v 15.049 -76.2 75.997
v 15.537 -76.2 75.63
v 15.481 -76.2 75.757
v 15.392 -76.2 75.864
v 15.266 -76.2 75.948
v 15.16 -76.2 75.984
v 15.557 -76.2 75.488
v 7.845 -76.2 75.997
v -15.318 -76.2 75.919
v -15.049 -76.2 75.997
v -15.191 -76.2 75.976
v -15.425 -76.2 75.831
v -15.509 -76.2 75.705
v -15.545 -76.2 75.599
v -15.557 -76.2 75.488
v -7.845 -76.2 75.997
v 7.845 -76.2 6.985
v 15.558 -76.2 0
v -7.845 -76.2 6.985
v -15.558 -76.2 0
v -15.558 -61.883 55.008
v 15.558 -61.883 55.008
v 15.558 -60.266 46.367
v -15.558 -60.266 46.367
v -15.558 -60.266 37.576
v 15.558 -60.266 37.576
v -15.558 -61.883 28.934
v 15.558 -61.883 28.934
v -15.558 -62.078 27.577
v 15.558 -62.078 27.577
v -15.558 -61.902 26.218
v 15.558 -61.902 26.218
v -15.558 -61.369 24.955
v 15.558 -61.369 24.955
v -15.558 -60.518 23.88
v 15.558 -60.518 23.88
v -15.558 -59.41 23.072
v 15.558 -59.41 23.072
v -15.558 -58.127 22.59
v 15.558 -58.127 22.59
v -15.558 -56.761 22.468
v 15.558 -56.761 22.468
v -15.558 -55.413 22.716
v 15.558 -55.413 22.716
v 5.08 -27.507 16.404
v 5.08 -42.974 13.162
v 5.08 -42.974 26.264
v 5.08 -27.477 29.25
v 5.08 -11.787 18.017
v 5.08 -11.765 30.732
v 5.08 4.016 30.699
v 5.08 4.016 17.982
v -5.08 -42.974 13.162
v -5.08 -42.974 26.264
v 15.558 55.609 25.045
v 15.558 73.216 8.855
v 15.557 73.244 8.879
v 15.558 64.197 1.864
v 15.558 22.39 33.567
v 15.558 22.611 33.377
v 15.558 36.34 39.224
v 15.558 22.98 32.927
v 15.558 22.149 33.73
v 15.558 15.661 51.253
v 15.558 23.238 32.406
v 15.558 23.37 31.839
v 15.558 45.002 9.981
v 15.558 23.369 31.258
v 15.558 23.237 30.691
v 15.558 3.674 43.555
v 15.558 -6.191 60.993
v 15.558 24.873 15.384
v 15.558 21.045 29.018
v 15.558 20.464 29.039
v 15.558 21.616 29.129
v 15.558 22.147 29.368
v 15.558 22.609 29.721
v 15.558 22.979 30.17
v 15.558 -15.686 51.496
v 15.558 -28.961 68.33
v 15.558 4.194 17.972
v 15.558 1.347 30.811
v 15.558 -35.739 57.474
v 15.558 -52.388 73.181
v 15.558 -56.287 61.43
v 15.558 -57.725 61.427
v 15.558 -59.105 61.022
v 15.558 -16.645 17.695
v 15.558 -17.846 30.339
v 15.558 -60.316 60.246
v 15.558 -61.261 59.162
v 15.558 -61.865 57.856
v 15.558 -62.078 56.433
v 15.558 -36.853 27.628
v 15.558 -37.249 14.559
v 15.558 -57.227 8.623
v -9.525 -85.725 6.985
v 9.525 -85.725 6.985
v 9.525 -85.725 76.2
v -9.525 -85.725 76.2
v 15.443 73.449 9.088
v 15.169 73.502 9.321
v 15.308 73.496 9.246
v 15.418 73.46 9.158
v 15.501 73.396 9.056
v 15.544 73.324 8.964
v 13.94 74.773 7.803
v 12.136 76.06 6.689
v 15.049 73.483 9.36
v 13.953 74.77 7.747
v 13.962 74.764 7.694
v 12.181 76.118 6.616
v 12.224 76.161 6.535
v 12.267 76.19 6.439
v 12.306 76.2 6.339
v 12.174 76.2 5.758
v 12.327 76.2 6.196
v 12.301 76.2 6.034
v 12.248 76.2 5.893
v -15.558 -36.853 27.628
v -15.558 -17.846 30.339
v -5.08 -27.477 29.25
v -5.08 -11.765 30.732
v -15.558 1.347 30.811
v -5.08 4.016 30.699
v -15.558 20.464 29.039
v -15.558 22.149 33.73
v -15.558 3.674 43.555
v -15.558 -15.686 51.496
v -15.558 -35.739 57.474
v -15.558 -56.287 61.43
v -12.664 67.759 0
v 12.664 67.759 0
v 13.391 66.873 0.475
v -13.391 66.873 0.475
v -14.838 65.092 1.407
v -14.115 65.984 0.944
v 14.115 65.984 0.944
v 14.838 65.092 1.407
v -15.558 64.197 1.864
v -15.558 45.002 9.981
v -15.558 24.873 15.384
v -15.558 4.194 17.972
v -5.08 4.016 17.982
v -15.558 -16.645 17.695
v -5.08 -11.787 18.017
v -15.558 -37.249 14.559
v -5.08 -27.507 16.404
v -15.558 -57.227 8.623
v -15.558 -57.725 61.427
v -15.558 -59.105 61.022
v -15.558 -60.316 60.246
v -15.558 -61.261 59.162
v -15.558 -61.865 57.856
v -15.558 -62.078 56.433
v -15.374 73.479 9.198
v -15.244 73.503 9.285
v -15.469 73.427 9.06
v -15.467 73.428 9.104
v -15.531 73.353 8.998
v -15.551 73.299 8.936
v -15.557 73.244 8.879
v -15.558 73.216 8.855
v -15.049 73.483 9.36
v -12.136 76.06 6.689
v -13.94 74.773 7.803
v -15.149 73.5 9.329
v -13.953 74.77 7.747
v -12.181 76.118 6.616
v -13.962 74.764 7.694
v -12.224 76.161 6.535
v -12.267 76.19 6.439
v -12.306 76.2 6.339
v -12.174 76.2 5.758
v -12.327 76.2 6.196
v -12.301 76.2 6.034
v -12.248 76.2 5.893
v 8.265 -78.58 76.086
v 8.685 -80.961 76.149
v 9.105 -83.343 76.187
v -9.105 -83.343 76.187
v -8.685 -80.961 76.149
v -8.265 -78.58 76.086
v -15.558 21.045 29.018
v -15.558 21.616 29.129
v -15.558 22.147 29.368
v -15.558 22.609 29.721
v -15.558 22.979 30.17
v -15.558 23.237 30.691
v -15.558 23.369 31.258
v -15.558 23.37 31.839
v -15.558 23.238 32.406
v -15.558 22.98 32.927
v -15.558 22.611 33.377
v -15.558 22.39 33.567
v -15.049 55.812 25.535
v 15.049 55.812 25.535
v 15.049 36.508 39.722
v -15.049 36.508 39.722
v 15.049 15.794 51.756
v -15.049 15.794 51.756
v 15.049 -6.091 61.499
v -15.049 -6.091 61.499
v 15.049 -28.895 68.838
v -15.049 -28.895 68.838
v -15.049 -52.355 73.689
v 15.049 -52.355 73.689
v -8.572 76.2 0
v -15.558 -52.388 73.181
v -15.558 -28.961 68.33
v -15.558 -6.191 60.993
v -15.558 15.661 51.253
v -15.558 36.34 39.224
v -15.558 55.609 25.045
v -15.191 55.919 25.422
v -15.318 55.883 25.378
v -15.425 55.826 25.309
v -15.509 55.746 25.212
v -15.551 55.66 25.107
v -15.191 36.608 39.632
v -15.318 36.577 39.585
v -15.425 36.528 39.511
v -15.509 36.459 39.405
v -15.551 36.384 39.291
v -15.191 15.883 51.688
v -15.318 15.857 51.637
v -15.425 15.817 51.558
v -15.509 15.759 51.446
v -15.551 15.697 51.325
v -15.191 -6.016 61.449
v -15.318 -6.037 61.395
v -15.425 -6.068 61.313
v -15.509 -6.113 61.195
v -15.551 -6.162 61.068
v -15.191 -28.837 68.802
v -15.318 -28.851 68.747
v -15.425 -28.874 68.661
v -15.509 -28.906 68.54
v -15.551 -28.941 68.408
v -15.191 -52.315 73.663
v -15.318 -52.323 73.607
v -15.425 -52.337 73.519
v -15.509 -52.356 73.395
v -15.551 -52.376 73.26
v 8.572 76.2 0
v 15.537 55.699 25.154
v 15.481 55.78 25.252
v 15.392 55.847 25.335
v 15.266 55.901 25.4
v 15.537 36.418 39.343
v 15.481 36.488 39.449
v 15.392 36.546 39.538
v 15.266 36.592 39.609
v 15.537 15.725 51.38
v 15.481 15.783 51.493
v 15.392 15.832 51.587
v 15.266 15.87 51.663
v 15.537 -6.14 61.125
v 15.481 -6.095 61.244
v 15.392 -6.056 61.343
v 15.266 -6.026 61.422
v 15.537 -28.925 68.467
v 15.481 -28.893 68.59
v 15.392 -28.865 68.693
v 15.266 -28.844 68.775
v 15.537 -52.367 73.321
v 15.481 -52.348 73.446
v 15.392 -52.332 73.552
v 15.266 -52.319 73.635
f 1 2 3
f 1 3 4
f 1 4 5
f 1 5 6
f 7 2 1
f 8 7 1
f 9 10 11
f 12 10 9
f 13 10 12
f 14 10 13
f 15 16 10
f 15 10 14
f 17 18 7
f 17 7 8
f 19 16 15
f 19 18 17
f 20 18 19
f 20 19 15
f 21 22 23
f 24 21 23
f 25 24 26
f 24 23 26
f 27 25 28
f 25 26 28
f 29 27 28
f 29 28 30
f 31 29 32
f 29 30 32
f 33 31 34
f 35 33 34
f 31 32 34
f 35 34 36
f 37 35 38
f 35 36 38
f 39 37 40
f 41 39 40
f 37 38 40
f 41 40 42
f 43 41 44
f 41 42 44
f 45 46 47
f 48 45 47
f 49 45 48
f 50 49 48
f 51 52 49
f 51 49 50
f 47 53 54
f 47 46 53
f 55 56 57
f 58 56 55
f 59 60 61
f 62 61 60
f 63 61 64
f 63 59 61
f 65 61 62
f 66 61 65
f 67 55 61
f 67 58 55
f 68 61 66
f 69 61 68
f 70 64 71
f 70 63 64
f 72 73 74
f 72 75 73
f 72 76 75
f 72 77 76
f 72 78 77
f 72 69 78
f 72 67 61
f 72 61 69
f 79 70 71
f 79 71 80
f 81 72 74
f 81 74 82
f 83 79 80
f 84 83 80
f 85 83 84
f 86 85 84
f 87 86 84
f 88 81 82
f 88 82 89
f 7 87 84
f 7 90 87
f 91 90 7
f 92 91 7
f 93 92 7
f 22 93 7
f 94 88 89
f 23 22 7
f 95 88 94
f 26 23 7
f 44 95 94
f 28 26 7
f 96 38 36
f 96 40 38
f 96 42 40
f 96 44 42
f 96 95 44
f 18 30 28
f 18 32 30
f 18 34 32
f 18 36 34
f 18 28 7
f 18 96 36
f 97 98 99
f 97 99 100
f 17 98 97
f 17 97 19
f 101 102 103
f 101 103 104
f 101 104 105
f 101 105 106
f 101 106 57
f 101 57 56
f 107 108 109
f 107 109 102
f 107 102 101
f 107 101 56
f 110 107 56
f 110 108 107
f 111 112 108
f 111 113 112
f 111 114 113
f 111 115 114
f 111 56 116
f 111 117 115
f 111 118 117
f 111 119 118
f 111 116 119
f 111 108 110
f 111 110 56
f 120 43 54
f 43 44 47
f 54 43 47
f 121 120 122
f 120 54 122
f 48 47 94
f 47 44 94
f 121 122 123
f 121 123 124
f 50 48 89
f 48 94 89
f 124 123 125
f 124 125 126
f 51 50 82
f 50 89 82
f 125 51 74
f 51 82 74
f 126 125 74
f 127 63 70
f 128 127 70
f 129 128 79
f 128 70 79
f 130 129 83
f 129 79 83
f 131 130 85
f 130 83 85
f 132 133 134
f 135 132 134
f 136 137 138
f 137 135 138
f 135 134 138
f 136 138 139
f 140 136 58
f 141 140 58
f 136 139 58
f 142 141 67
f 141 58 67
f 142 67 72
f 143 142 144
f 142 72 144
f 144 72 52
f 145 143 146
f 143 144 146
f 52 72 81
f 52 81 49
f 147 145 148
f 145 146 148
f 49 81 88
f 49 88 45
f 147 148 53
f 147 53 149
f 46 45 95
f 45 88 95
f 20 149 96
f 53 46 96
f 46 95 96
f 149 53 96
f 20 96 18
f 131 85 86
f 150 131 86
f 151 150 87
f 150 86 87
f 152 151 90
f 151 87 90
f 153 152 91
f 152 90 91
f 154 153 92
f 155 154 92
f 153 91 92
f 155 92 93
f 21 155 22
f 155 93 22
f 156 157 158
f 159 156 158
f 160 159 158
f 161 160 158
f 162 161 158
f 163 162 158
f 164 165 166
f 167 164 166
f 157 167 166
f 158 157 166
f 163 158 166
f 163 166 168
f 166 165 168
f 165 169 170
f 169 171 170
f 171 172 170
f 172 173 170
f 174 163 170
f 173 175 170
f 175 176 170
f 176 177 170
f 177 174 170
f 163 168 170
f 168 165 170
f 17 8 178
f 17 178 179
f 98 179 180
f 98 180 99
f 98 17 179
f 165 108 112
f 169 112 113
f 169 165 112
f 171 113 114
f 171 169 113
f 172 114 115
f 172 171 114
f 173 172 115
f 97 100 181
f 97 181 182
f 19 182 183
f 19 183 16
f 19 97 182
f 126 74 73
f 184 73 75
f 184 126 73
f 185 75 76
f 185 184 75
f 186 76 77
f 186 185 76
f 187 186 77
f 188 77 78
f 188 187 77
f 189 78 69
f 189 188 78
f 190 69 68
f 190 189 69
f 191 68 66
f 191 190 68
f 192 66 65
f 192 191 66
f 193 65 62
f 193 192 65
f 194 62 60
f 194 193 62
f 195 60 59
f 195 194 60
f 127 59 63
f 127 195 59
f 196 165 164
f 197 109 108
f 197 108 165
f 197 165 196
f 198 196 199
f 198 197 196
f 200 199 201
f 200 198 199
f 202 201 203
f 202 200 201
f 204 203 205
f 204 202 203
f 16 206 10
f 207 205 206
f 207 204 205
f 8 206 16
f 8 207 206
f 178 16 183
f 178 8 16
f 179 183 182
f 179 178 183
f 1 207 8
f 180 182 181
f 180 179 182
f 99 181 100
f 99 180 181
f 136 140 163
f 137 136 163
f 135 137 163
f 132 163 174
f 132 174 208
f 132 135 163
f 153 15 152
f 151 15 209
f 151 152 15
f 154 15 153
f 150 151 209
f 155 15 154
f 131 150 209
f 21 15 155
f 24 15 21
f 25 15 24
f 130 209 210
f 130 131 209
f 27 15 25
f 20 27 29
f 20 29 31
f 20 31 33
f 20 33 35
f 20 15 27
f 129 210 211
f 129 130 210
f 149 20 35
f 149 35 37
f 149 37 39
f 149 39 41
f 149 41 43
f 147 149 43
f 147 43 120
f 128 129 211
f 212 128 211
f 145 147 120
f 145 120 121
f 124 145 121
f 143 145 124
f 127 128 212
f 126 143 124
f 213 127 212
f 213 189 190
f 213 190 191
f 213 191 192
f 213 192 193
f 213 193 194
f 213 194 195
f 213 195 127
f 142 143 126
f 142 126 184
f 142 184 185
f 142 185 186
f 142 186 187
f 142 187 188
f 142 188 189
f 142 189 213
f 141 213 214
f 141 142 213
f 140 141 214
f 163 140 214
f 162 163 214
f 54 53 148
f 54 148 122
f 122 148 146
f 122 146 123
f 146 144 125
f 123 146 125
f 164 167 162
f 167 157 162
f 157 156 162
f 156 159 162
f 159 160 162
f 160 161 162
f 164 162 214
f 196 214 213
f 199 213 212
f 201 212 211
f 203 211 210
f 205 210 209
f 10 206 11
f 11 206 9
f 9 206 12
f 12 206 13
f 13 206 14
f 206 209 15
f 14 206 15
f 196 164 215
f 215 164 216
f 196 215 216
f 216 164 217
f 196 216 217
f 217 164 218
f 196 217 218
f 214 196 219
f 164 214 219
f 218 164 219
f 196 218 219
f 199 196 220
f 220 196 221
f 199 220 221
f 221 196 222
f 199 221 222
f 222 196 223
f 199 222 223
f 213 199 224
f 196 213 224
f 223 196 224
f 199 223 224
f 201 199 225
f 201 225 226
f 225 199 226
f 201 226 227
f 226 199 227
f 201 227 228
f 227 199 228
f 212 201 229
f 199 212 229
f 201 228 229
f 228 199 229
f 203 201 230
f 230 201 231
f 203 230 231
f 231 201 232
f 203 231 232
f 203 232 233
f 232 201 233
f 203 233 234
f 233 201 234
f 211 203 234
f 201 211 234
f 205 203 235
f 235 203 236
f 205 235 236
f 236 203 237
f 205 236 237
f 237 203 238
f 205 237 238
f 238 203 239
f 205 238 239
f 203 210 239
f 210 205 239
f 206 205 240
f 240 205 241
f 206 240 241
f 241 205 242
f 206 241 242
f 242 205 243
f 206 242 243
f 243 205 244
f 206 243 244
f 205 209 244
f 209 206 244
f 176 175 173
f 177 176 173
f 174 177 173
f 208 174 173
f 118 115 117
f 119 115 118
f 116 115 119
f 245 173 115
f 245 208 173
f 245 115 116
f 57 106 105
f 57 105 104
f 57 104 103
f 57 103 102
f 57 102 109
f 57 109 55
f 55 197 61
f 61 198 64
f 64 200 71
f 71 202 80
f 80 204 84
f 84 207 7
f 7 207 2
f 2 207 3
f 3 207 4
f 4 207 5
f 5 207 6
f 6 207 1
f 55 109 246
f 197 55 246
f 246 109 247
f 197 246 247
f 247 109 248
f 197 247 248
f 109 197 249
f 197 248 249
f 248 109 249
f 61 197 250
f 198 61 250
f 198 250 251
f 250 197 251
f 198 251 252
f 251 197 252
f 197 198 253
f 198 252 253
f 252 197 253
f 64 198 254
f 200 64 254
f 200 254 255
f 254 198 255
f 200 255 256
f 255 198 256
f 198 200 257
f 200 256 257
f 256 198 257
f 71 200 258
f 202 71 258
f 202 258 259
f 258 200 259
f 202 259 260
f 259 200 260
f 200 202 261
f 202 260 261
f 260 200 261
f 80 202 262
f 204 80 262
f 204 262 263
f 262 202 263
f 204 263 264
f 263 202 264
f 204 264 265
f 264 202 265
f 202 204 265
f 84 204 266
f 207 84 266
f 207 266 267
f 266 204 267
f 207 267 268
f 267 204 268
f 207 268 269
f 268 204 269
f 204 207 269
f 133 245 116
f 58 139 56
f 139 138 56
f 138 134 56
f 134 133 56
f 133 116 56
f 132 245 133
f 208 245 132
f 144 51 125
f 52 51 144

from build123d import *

# Parameters (mm, degrees)
BOSS_EXTRUDE1_DEPTH = 76.2
SKETCH2_W           = 6.985
SKETCH2_H           = 9.525
CUT_EXTRUDE1_DEPTH  = 119.84173867
CUT_EXTRUDE2_DEPTH  = 119.84173867
CUT_EXTRUDE3_DEPTH  = 119.84173867
FILLET1_R           = 2.54
CUT_EXTRUDE4_DEPTH  = 5.08
CUT_EXTRUDE6_DEPTH  = 15.113
FILLET2_R           = 0.508


with BuildPart() as part:
    # Sketch1 → Boss-Extrude1 (new body)
    with BuildSketch(Plane.XY):
        Polygon((-15.5575, 76.2), (15.5575, 76.2), (15.5575, -76.2), (7.845485509, -76.2), (9.525, -85.725), (-9.525, -85.725), (-7.845485509, -76.2), (-15.5575, -76.2), align=None)
    extrude(amount=BOSS_EXTRUDE1_DEPTH)

    # Sketch2 → Cut-Extrude1 (cut, through all)
    with BuildSketch(Plane(origin=(15.5575, 0, 0), x_dir=(0, 0, -1), z_dir=(1, 0, 0))):
        with Locations((-3.4925, -80.9625)):
            Rectangle(SKETCH2_W, SKETCH2_H)
    extrude(amount=-CUT_EXTRUDE1_DEPTH, mode=Mode.SUBTRACT)

    # Sketch3 → Cut-Extrude2 (cut, through all)
    with BuildSketch(Plane(origin=(15.5575, 0, 0), x_dir=(0, 0, -1), z_dir=(1, 0, 0))):
        with BuildLine():
            Line((-76.2, -85.725), (-76.2, -76.2))
            Line((-76.2, -76.2), (-76.2, 76.2))
            Line((-76.2, 76.2), (-6.541803462, 76.2))
            ThreePointArc((-6.541803462, 76.2), (-58.046669251, 2.411215556), (-76.2, -85.725))
        make_face()
        with BuildLine():
            Line((0, -76.2), (0, 67.75939176))
            ThreePointArc((0, 67.75939176), (-18.20597202, -4.22030412), (0, -76.2))
        make_face()
    extrude(amount=-CUT_EXTRUDE2_DEPTH, mode=Mode.SUBTRACT)

    # Sketch6 → Cut-Extrude3 (cut, through all)
    with BuildSketch(Plane(origin=(15.5575, 0, 0), x_dir=(0, 0, -1), z_dir=(1, 0, 0))):
        with BuildLine():
            ThreePointArc((-28.934409948, -61.883434575), (-23.879909813, -60.517759582), (-22.716254779, -55.412963136))
            ThreePointArc((-22.716254779, -55.412963136), (-30.753414225, -11.294498854), (-26.546552055, 33.352305435))
            ThreePointArc((-26.546552055, 33.352305435), (-49.181053892, -9.446405872), (-61.429710833, -56.286781256))
            ThreePointArc((-61.429710833, -56.286781256), (-59.737369376, -60.827463042), (-55.008021131, -61.883434575))
            ThreePointArc((-55.008021131, -61.883434575), (-41.971215539, -60.062859411), (-28.934409948, -61.883434575))
        make_face()
    extrude(amount=-CUT_EXTRUDE3_DEPTH, mode=Mode.SUBTRACT)

    # Fillet1
    fillet1_edges = [part.edges().sort_by_distance(p)[0] for p in [
        (0, 33.352305435, 26.546552055),
    ]]
    fillet(fillet1_edges, radius=FILLET1_R)

    # Sketch7 → Cut-Extrude4 (cut, symmetric)
    with BuildSketch(Plane(origin=(0, 0, 0), x_dir=(0, 0, -1), z_dir=(1, 0, 0))):
        with BuildLine():
            Line((-30.699128799, 4.016230293), (-17.981752538, 4.016230293))
            ThreePointArc((-17.981752538, 4.016230293), (-17.415803594, -19.667907964), (-13.161921654, -42.973769707))
            Line((-13.161921654, -42.973769707), (-26.264177108, -42.973769707))
            ThreePointArc((-26.264177108, -42.973769707), (-30.179968378, -19.639057999), (-30.699128799, 4.016230293))
        make_face()
    extrude(amount=CUT_EXTRUDE4_DEPTH, both=True, mode=Mode.SUBTRACT)

    # Sketch10 → Cut-Extrude6 (cut, symmetric)
    with BuildSketch(Plane(origin=(15.5575, 76.2, 6.541803462), x_dir=(-1, 0, 0), z_dir=(0, -0.7903999954772005, -0.6125910929401777))):
        Polygon((0, 5.170641427), (6.985, 5.170641427), (0, -3.655858573), align=None)
        Polygon((31.115, 5.170641427), (31.115, -3.655858573), (24.13, 5.170641427), align=None)
    extrude(amount=CUT_EXTRUDE6_DEPTH, both=True, mode=Mode.SUBTRACT)

    # Fillet2
    fillet2_edges = [part.edges().sort_by_distance(p)[0] for p in [
        (0, 76.2, 6.541803462),
        (-14.111333502, 74.930435776, 7.871138317),
        (14.111333502, 74.930435776, 7.871138317),
        (-15.5575, 5.090891194, 56.873019023),
        (15.5575, 5.090891194, 56.873019023),
    ]]
    fillet(fillet2_edges, radius=FILLET2_R)


solid = part.part
